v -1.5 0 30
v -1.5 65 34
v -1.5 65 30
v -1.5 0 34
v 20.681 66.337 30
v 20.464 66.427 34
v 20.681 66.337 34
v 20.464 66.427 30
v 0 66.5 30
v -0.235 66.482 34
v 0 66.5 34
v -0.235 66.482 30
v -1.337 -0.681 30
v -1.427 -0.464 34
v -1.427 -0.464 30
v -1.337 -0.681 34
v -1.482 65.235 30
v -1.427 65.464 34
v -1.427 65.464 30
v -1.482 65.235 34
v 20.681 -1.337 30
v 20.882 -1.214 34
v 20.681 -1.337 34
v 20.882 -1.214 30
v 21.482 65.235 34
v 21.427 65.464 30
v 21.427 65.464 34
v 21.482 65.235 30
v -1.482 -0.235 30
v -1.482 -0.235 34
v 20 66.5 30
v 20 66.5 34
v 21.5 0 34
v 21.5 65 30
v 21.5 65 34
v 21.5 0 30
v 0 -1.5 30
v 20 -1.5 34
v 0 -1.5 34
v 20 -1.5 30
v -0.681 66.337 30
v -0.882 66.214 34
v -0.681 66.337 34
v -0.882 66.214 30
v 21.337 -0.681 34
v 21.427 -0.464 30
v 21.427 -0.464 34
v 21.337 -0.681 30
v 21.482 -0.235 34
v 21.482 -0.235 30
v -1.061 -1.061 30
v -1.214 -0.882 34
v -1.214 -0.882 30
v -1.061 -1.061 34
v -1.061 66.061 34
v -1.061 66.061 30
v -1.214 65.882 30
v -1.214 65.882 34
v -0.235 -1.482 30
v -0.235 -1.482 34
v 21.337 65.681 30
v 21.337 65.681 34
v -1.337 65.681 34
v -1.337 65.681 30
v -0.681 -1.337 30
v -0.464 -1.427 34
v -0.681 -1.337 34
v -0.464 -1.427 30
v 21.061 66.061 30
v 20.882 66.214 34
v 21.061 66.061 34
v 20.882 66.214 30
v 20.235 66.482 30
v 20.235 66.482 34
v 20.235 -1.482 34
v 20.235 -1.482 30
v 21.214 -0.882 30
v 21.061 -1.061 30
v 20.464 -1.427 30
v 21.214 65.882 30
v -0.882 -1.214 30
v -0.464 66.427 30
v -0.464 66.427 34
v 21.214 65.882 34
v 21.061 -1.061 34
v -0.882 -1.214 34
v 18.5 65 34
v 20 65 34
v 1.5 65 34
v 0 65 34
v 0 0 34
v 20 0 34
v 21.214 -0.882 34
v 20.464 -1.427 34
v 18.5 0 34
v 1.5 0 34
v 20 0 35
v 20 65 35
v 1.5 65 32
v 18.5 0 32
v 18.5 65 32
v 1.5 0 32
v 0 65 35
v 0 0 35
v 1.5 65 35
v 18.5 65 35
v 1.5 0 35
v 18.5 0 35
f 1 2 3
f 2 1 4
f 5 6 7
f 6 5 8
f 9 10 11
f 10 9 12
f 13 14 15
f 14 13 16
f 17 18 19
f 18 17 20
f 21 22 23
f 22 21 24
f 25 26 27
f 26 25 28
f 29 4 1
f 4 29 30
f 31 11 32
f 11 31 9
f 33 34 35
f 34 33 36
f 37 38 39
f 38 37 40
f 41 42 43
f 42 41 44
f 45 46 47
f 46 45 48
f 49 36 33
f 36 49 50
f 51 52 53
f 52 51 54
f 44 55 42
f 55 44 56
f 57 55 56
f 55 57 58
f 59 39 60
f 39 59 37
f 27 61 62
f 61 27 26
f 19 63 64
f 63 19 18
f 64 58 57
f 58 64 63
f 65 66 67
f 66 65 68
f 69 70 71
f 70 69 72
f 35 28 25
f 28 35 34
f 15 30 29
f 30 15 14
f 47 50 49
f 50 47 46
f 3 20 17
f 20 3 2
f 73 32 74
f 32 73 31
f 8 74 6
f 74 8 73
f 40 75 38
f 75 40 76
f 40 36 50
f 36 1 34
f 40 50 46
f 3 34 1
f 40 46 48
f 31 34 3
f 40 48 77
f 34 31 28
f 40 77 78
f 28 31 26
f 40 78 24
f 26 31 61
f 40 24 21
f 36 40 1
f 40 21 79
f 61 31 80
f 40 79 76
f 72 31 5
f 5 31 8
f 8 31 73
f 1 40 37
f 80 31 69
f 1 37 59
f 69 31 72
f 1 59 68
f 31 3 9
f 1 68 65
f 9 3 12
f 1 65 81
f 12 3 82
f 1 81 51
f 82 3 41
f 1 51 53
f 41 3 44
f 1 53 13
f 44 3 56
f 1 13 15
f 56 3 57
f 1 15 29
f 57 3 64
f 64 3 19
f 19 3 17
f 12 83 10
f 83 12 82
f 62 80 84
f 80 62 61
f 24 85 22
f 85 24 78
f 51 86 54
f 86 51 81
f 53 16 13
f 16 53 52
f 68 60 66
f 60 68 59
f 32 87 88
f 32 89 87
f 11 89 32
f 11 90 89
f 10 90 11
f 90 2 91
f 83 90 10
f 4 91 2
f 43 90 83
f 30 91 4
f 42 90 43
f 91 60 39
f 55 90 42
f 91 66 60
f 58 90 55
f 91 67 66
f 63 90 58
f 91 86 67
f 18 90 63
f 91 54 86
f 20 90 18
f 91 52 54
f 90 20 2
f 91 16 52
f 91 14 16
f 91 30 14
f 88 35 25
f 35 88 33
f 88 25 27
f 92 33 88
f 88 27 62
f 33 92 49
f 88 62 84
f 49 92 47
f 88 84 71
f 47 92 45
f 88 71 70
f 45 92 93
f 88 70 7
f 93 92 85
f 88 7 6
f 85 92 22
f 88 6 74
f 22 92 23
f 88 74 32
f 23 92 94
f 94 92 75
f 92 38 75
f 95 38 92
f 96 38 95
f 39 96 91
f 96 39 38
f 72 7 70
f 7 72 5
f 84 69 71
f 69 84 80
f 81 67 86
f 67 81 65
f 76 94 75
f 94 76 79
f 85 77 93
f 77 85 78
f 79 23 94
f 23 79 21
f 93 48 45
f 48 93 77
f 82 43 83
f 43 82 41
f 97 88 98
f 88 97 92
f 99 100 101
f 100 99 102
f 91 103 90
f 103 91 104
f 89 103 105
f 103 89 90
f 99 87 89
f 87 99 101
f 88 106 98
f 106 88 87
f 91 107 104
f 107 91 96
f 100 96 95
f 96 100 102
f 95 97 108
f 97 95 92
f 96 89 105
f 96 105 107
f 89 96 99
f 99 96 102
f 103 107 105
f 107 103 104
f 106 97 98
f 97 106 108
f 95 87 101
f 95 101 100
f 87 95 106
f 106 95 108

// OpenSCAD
$fn = 40;
//box();
lid();

module box() difference(){
    hull(){
        translate([0,65,0])cylinder(d=3,h=20);
        translate([20,65,0])cylinder(d=3,h=20);
        translate([20,0,0])cylinder(d=3,h=20);
        translate([0,0,0])cylinder(d=3,h=20);
    }
    translate([0,0,2])cube([20,65,22]);
    translate([1.5,-5,6])cube([17,10,15]);
    translate([1.5,-5,6])cube([17,10,15]);
    translate([10-5.5,66,13.1])cube([11,4,7]);
    translate([10-4,64,15])cube([8,4,3]);
}
         

module lid() translate([0,0,30]) union(){ 
   difference(){
      hull(){
        translate([0,65,0])cylinder(d=3,h=4);
        translate([20,65,0])cylinder(d=3,h=4);
        translate([20,0,0])cylinder(d=3,h=4);
        translate([0,0,0])cylinder(d=3,h=4);
    }
    translate([0,0,2])cube([20,65,10]);
  }

    translate([0,0,2])cube([1.5,65,3]);
    translate([20-1.5,0,2])cube([1.5,65,3]);
}
